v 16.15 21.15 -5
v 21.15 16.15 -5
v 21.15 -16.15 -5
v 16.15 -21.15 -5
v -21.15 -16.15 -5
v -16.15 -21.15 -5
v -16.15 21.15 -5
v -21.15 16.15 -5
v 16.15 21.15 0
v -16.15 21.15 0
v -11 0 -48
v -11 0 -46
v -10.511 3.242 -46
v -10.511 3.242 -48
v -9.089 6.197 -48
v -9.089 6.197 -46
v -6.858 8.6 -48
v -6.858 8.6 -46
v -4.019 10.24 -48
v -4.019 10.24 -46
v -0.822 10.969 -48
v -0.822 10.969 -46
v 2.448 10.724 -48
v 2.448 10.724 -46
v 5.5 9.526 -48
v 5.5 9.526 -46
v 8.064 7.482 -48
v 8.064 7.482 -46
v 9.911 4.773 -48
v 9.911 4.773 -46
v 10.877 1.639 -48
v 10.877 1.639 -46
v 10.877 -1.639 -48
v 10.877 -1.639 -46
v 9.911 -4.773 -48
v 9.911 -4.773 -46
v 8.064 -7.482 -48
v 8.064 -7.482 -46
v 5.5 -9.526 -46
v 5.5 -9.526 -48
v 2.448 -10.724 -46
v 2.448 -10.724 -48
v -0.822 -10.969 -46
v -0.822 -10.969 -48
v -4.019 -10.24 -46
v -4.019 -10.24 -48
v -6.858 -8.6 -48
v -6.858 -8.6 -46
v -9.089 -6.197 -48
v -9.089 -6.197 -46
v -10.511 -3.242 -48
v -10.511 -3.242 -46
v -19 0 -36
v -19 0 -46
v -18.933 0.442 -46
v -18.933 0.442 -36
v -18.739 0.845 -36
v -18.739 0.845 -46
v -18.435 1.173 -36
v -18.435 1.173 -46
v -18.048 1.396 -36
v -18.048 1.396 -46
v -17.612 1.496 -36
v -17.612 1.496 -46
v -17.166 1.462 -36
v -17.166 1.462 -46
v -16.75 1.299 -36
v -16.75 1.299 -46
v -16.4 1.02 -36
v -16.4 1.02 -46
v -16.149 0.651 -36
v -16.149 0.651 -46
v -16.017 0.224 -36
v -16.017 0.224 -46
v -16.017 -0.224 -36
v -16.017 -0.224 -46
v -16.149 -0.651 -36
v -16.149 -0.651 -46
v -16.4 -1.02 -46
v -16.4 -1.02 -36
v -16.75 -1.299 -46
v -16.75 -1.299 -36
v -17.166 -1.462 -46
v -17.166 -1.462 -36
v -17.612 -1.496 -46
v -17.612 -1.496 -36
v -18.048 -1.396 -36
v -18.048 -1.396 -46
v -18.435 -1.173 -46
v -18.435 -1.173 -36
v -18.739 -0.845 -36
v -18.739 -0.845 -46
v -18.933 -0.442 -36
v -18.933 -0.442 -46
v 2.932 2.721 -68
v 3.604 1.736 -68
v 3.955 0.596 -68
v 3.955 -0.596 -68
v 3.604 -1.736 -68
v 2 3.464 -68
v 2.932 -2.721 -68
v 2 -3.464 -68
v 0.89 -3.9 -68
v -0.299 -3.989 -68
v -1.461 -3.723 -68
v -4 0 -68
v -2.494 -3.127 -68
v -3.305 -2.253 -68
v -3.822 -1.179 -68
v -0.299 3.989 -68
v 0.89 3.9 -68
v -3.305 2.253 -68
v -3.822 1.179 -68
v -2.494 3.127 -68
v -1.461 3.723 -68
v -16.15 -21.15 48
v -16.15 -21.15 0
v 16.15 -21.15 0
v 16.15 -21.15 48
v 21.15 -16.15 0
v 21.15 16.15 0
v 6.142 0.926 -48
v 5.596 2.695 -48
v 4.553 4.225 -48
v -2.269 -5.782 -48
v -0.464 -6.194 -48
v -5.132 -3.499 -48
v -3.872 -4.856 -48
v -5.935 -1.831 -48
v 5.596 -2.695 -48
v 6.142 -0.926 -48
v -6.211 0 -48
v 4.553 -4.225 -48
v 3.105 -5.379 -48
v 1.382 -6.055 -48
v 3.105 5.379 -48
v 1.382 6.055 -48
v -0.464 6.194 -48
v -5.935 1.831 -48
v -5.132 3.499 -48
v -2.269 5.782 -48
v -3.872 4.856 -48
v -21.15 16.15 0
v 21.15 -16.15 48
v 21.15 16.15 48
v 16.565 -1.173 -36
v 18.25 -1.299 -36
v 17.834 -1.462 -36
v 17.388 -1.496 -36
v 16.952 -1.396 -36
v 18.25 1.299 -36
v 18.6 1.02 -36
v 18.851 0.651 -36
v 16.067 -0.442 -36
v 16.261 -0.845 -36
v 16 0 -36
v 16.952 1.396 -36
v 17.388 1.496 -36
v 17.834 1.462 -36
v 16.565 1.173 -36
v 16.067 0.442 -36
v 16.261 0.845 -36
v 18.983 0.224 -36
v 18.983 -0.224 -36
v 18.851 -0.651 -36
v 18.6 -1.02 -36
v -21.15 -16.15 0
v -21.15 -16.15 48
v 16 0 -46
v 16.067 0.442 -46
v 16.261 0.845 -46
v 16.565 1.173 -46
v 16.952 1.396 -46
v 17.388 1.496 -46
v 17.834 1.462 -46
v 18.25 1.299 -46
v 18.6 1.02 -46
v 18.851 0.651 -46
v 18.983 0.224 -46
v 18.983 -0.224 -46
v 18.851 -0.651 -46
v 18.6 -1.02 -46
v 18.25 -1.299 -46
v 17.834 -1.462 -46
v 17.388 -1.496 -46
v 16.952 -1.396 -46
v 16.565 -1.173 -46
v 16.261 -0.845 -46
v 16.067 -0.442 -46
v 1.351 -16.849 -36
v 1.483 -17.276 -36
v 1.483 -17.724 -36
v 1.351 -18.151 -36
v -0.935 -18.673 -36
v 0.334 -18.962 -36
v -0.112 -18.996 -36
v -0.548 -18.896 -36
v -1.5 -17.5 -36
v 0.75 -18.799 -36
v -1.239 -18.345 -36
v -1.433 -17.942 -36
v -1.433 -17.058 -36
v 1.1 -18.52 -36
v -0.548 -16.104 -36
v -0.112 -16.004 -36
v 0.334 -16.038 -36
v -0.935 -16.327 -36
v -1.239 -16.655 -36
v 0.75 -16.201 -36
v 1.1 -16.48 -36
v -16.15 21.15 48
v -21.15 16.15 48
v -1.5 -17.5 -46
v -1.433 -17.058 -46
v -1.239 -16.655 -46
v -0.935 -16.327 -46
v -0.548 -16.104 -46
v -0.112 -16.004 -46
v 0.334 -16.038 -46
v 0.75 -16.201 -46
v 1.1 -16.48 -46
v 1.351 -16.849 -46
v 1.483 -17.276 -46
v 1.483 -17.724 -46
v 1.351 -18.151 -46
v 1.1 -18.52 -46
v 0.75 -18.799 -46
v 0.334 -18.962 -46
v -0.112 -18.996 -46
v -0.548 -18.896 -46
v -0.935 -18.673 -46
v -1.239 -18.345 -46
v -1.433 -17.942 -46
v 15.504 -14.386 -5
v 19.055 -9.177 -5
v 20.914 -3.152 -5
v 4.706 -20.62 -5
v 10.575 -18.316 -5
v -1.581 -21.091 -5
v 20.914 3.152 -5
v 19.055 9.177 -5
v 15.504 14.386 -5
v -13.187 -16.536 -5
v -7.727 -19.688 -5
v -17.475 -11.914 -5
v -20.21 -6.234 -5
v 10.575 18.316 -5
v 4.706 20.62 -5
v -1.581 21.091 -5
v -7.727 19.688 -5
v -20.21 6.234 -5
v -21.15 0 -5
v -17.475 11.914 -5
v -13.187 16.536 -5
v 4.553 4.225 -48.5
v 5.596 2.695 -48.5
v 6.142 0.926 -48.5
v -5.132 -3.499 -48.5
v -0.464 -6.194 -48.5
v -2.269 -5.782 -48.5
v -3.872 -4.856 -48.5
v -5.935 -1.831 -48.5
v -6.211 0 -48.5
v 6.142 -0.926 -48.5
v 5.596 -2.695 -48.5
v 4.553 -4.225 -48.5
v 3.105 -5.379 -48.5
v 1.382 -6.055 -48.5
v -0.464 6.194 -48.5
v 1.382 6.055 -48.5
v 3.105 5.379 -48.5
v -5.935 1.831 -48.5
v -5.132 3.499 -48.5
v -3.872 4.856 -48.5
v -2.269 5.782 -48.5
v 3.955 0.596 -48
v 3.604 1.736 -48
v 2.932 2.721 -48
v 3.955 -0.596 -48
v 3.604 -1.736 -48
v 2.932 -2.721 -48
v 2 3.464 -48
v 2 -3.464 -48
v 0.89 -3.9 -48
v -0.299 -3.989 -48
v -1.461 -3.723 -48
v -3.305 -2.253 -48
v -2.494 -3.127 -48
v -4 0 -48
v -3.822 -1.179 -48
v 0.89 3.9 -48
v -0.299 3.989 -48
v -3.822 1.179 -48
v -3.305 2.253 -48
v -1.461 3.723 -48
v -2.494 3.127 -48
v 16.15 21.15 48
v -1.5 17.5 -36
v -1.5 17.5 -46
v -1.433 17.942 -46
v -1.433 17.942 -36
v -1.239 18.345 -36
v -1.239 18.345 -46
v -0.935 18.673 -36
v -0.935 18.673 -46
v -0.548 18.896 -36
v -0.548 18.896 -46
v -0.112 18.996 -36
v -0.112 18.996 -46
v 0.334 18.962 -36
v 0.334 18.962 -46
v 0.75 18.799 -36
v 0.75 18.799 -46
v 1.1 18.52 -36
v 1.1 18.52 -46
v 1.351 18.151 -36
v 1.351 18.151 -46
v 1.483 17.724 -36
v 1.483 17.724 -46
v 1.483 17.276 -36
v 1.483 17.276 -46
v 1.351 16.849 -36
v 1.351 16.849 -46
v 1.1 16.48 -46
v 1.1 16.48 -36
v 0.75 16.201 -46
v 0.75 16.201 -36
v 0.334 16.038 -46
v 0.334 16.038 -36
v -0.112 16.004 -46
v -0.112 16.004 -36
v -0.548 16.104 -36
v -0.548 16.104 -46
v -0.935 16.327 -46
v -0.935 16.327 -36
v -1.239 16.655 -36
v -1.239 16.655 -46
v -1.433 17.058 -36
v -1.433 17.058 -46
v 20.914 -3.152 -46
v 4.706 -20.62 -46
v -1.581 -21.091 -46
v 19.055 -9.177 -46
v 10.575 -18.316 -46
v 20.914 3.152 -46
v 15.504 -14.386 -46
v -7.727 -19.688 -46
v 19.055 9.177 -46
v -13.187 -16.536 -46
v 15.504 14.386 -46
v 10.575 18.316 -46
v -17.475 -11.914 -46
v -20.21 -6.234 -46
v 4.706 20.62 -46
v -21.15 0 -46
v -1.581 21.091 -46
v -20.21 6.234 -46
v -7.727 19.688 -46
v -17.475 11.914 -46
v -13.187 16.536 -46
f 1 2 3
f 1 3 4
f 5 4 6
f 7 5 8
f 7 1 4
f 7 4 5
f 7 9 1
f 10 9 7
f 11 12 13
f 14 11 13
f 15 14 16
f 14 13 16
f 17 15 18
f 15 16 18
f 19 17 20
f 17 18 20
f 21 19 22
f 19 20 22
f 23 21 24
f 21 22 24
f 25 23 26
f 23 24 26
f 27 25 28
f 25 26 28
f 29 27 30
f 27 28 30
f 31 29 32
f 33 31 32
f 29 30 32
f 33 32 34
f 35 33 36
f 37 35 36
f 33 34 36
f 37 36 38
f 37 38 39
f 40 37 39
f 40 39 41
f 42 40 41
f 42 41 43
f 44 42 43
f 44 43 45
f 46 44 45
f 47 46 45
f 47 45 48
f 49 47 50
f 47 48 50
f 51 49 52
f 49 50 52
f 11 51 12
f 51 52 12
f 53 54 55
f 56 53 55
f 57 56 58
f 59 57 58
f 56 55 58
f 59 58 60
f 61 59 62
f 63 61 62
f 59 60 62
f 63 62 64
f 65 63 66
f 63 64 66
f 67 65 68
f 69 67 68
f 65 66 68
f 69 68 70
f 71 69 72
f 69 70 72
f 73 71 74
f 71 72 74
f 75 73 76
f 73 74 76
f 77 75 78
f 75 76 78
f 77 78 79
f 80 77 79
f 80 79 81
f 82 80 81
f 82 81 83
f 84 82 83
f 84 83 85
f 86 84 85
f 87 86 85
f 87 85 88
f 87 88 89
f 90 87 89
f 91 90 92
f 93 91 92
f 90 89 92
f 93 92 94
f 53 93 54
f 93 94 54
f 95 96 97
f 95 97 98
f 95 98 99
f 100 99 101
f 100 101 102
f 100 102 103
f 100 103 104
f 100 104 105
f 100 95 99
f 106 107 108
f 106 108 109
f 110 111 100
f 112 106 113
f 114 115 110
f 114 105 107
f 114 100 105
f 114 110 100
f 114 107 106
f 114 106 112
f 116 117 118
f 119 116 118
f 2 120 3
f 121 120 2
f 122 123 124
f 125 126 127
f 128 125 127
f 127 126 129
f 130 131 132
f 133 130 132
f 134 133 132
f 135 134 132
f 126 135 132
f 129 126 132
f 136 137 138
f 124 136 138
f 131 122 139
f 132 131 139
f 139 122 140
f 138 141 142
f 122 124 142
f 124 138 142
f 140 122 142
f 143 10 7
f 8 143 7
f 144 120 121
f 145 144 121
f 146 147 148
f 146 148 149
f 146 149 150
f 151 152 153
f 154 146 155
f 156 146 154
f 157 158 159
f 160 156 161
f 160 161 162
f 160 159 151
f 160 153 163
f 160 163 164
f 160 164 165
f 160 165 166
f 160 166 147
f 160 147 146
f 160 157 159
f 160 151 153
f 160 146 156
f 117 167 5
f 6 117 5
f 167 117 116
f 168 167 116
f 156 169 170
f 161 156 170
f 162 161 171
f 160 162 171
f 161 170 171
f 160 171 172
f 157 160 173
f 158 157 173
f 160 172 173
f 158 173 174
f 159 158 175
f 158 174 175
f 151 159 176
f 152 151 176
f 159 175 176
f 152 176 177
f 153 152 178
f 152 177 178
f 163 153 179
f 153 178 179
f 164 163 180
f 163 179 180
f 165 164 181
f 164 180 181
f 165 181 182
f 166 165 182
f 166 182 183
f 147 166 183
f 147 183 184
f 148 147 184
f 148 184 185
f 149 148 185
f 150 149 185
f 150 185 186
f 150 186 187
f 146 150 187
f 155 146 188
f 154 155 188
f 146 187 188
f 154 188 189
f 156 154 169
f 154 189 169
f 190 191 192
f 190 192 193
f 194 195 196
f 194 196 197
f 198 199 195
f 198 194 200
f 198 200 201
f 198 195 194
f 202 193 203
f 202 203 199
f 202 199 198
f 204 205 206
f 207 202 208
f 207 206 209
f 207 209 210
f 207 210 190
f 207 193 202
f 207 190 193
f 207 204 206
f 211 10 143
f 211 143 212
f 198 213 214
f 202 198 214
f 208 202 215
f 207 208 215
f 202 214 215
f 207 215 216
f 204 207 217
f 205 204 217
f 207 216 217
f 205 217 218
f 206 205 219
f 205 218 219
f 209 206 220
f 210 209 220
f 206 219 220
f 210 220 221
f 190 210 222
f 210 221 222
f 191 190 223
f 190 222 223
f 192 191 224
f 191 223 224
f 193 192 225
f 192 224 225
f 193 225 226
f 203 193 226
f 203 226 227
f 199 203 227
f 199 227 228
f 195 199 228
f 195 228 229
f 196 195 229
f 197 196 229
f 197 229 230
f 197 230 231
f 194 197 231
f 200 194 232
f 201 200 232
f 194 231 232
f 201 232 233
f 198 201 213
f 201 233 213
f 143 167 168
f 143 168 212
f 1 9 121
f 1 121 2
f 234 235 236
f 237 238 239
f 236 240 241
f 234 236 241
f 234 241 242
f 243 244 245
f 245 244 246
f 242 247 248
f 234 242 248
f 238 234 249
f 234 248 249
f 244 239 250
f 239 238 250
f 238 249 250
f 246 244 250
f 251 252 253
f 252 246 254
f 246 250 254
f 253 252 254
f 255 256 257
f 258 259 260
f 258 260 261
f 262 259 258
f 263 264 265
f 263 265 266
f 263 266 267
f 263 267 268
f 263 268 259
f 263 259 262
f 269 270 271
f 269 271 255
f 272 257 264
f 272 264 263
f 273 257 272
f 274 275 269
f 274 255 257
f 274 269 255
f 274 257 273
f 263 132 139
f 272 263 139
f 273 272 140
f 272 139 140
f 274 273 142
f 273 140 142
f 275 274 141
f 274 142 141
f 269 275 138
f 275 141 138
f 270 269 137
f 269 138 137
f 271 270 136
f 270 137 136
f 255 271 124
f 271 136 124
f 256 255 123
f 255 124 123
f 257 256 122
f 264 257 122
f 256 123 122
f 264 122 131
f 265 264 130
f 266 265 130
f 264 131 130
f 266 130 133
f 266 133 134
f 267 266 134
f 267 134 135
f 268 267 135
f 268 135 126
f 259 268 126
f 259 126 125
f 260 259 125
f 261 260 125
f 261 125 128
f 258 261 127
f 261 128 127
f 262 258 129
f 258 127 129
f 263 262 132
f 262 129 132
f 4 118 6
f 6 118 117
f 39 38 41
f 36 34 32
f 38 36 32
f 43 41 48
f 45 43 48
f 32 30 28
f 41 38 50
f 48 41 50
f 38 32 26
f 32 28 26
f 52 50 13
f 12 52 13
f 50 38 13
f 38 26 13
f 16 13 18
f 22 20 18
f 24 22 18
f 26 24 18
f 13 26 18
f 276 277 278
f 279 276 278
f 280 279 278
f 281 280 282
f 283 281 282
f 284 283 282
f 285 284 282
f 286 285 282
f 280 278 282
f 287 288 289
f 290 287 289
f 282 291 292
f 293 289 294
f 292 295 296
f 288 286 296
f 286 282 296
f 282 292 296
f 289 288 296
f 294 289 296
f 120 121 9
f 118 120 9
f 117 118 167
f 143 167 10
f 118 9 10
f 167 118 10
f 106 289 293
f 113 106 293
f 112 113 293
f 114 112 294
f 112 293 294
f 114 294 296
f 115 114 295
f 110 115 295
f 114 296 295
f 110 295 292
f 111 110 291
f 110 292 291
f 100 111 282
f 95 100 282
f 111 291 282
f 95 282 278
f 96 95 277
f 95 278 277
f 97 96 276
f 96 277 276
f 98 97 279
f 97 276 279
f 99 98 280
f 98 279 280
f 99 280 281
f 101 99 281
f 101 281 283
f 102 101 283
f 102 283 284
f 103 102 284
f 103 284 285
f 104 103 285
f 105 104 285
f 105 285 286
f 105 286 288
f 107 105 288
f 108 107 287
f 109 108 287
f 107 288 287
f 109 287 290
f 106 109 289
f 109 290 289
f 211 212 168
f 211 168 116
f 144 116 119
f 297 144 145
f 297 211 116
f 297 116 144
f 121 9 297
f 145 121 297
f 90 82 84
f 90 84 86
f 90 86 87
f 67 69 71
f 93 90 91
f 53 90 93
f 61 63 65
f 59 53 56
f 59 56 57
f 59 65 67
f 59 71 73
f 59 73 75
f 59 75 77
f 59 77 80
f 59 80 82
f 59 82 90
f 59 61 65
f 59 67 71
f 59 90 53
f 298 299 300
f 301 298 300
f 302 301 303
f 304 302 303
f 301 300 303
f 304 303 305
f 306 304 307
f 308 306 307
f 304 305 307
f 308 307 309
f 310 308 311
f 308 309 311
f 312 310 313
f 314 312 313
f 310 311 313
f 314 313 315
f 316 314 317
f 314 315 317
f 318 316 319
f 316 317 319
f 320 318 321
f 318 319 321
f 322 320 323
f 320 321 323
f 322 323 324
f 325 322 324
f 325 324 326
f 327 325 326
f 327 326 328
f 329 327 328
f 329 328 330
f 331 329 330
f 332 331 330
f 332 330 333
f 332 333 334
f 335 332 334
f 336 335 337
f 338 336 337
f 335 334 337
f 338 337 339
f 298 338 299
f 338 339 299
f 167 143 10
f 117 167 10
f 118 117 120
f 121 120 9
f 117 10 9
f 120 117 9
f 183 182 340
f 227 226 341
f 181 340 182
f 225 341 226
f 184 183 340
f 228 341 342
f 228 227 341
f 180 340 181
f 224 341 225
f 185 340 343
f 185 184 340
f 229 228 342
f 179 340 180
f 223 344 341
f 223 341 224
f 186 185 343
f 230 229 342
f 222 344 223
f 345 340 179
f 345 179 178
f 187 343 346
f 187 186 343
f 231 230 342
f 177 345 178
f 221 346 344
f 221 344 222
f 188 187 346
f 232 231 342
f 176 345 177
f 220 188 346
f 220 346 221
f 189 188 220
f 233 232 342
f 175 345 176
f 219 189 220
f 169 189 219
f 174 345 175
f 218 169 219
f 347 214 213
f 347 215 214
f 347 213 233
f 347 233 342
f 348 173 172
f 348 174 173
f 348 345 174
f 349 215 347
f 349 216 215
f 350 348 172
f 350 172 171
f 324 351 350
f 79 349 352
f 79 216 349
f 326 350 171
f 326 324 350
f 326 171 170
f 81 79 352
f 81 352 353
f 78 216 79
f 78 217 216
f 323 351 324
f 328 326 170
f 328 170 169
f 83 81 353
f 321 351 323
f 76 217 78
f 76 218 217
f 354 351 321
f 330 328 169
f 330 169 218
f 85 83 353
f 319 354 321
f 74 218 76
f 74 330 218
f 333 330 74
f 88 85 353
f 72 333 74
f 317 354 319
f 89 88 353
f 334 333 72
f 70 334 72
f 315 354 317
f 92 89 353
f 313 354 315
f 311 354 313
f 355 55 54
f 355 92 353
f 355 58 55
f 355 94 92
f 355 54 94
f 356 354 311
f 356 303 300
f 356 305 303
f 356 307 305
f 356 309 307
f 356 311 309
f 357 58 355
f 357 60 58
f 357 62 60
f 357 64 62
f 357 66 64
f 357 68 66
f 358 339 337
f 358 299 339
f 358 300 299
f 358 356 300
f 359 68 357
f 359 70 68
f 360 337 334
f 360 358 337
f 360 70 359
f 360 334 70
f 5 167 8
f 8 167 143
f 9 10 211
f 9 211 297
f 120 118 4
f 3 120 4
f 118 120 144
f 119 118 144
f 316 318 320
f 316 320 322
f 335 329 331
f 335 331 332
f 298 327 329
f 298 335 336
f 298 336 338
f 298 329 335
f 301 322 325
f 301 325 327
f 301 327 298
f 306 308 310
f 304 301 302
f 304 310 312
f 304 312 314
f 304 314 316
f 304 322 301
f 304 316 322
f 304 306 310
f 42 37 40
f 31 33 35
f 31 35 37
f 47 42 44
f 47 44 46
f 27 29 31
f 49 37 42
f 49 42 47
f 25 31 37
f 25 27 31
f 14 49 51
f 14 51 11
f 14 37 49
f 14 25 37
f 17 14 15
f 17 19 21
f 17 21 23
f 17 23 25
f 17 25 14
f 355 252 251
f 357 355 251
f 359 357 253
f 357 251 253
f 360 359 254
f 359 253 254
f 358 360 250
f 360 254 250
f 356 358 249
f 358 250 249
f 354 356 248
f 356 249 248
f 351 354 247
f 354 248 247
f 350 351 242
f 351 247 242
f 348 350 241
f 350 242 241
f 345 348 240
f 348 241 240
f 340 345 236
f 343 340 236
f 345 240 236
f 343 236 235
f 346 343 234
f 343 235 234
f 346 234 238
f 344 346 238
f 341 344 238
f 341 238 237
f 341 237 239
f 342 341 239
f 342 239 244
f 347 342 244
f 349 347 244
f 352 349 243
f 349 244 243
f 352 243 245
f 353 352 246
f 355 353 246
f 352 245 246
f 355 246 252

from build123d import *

# Parameters (mm, degrees)
SKETCH1_W           = 42.3
SKETCH1_H           = 42.3
BOSS_EXTRUDE1_DEPTH = 48
CHAMFER1_SIZE       = 5
SKETCH2_W           = 42.3
SKETCH2_H           = 42.3
BOSS_EXTRUDE2_DEPTH = 5
CHAMFER2_SIZE       = 5
SKETCH3_R           = 21.15
BOSS_EXTRUDE3_DEPTH = 41
SKETCH4_R           = 11
BOSS_EXTRUDE4_DEPTH = 2
SKETCH5_R           = 4
BOSS_EXTRUDE5_DEPTH = 20
SKETCH6_R           = 6.210975092
BOSS_EXTRUDE6_DEPTH = 0.5
SKETCH7_R           = 1.5
CUT_EXTRUDE2_DEPTH  = 10


with BuildPart() as part:
    # Sketch1 → Boss-Extrude1 (new body)
    with BuildSketch(Plane.XY):
        Rectangle(SKETCH1_W, SKETCH1_H)
    extrude(amount=BOSS_EXTRUDE1_DEPTH)

    # Chamfer1
    chamfer1_edges = [part.edges().sort_by_distance(p)[0] for p in [
        (21.15, -21.15, 24),
        (-21.15, -21.15, 24),
        (-21.15, 21.15, 24),
        (21.15, 21.15, 24),
    ]]
    chamfer(chamfer1_edges, length=CHAMFER1_SIZE)


with BuildPart() as body_2:
    # Sketch2 → Boss-Extrude2 (new body)
    with BuildSketch(Plane(origin=(0, 0, 0), x_dir=(-1, 0, 0), z_dir=(0, 0, -1))):
        Rectangle(SKETCH2_W, SKETCH2_H)
    extrude(amount=BOSS_EXTRUDE2_DEPTH)

    # Chamfer2
    chamfer2_edges = [body_2.edges().sort_by_distance(p)[0] for p in [
        (-21.15, -21.15, -2.5),
        (21.15, -21.15, -2.5),
        (21.15, 21.15, -2.5),
        (-21.15, 21.15, -2.5),
    ]]
    chamfer(chamfer2_edges, length=CHAMFER2_SIZE)


with BuildPart() as body_3:
    # Sketch3 → Boss-Extrude3 (new body)
    with BuildSketch(Plane(origin=(0, 0, -5), x_dir=(-1, 0, 0), z_dir=(0, 0, -1))):
        Circle(SKETCH3_R)
    extrude(amount=BOSS_EXTRUDE3_DEPTH)

    # Sketch7 → Cut-Extrude2 (cut)
    with BuildSketch(Plane(origin=(0, 0, -46), x_dir=(-1, 0, 0), z_dir=(0, 0, -1))):
        with Locations((-17.5, 0)):
            Circle(SKETCH7_R)
        with Locations((0, 17.5)):
            Circle(SKETCH7_R)
        with Locations((17.5, 0)):
            Circle(SKETCH7_R)
        with Locations((0, -17.5)):
            Circle(SKETCH7_R)
    extrude(amount=-CUT_EXTRUDE2_DEPTH, mode=Mode.SUBTRACT)


with BuildPart() as body_4:
    # Sketch4 → Boss-Extrude4 (new body)
    with BuildSketch(Plane(origin=(0, 0, -46), x_dir=(-1, 0, 0), z_dir=(0, 0, -1))):
        Circle(SKETCH4_R)
    extrude(amount=BOSS_EXTRUDE4_DEPTH)


with BuildPart() as body_5:
    # Sketch5 → Boss-Extrude5 (new body)
    with BuildSketch(Plane(origin=(0, 0, -48), x_dir=(-1, 0, 0), z_dir=(0, 0, -1))):
        Circle(SKETCH5_R)
    extrude(amount=BOSS_EXTRUDE5_DEPTH)


with BuildPart() as body_6:
    # Sketch6 → Boss-Extrude6 (new body)
    with BuildSketch(Plane(origin=(0, 0, -48), x_dir=(-1, 0, 0), z_dir=(0, 0, -1))):
        Circle(SKETCH6_R)
    extrude(amount=BOSS_EXTRUDE6_DEPTH)


solid = Compound([part.part, body_2.part, body_3.part, body_4.part, body_5.part, body_6.part])
